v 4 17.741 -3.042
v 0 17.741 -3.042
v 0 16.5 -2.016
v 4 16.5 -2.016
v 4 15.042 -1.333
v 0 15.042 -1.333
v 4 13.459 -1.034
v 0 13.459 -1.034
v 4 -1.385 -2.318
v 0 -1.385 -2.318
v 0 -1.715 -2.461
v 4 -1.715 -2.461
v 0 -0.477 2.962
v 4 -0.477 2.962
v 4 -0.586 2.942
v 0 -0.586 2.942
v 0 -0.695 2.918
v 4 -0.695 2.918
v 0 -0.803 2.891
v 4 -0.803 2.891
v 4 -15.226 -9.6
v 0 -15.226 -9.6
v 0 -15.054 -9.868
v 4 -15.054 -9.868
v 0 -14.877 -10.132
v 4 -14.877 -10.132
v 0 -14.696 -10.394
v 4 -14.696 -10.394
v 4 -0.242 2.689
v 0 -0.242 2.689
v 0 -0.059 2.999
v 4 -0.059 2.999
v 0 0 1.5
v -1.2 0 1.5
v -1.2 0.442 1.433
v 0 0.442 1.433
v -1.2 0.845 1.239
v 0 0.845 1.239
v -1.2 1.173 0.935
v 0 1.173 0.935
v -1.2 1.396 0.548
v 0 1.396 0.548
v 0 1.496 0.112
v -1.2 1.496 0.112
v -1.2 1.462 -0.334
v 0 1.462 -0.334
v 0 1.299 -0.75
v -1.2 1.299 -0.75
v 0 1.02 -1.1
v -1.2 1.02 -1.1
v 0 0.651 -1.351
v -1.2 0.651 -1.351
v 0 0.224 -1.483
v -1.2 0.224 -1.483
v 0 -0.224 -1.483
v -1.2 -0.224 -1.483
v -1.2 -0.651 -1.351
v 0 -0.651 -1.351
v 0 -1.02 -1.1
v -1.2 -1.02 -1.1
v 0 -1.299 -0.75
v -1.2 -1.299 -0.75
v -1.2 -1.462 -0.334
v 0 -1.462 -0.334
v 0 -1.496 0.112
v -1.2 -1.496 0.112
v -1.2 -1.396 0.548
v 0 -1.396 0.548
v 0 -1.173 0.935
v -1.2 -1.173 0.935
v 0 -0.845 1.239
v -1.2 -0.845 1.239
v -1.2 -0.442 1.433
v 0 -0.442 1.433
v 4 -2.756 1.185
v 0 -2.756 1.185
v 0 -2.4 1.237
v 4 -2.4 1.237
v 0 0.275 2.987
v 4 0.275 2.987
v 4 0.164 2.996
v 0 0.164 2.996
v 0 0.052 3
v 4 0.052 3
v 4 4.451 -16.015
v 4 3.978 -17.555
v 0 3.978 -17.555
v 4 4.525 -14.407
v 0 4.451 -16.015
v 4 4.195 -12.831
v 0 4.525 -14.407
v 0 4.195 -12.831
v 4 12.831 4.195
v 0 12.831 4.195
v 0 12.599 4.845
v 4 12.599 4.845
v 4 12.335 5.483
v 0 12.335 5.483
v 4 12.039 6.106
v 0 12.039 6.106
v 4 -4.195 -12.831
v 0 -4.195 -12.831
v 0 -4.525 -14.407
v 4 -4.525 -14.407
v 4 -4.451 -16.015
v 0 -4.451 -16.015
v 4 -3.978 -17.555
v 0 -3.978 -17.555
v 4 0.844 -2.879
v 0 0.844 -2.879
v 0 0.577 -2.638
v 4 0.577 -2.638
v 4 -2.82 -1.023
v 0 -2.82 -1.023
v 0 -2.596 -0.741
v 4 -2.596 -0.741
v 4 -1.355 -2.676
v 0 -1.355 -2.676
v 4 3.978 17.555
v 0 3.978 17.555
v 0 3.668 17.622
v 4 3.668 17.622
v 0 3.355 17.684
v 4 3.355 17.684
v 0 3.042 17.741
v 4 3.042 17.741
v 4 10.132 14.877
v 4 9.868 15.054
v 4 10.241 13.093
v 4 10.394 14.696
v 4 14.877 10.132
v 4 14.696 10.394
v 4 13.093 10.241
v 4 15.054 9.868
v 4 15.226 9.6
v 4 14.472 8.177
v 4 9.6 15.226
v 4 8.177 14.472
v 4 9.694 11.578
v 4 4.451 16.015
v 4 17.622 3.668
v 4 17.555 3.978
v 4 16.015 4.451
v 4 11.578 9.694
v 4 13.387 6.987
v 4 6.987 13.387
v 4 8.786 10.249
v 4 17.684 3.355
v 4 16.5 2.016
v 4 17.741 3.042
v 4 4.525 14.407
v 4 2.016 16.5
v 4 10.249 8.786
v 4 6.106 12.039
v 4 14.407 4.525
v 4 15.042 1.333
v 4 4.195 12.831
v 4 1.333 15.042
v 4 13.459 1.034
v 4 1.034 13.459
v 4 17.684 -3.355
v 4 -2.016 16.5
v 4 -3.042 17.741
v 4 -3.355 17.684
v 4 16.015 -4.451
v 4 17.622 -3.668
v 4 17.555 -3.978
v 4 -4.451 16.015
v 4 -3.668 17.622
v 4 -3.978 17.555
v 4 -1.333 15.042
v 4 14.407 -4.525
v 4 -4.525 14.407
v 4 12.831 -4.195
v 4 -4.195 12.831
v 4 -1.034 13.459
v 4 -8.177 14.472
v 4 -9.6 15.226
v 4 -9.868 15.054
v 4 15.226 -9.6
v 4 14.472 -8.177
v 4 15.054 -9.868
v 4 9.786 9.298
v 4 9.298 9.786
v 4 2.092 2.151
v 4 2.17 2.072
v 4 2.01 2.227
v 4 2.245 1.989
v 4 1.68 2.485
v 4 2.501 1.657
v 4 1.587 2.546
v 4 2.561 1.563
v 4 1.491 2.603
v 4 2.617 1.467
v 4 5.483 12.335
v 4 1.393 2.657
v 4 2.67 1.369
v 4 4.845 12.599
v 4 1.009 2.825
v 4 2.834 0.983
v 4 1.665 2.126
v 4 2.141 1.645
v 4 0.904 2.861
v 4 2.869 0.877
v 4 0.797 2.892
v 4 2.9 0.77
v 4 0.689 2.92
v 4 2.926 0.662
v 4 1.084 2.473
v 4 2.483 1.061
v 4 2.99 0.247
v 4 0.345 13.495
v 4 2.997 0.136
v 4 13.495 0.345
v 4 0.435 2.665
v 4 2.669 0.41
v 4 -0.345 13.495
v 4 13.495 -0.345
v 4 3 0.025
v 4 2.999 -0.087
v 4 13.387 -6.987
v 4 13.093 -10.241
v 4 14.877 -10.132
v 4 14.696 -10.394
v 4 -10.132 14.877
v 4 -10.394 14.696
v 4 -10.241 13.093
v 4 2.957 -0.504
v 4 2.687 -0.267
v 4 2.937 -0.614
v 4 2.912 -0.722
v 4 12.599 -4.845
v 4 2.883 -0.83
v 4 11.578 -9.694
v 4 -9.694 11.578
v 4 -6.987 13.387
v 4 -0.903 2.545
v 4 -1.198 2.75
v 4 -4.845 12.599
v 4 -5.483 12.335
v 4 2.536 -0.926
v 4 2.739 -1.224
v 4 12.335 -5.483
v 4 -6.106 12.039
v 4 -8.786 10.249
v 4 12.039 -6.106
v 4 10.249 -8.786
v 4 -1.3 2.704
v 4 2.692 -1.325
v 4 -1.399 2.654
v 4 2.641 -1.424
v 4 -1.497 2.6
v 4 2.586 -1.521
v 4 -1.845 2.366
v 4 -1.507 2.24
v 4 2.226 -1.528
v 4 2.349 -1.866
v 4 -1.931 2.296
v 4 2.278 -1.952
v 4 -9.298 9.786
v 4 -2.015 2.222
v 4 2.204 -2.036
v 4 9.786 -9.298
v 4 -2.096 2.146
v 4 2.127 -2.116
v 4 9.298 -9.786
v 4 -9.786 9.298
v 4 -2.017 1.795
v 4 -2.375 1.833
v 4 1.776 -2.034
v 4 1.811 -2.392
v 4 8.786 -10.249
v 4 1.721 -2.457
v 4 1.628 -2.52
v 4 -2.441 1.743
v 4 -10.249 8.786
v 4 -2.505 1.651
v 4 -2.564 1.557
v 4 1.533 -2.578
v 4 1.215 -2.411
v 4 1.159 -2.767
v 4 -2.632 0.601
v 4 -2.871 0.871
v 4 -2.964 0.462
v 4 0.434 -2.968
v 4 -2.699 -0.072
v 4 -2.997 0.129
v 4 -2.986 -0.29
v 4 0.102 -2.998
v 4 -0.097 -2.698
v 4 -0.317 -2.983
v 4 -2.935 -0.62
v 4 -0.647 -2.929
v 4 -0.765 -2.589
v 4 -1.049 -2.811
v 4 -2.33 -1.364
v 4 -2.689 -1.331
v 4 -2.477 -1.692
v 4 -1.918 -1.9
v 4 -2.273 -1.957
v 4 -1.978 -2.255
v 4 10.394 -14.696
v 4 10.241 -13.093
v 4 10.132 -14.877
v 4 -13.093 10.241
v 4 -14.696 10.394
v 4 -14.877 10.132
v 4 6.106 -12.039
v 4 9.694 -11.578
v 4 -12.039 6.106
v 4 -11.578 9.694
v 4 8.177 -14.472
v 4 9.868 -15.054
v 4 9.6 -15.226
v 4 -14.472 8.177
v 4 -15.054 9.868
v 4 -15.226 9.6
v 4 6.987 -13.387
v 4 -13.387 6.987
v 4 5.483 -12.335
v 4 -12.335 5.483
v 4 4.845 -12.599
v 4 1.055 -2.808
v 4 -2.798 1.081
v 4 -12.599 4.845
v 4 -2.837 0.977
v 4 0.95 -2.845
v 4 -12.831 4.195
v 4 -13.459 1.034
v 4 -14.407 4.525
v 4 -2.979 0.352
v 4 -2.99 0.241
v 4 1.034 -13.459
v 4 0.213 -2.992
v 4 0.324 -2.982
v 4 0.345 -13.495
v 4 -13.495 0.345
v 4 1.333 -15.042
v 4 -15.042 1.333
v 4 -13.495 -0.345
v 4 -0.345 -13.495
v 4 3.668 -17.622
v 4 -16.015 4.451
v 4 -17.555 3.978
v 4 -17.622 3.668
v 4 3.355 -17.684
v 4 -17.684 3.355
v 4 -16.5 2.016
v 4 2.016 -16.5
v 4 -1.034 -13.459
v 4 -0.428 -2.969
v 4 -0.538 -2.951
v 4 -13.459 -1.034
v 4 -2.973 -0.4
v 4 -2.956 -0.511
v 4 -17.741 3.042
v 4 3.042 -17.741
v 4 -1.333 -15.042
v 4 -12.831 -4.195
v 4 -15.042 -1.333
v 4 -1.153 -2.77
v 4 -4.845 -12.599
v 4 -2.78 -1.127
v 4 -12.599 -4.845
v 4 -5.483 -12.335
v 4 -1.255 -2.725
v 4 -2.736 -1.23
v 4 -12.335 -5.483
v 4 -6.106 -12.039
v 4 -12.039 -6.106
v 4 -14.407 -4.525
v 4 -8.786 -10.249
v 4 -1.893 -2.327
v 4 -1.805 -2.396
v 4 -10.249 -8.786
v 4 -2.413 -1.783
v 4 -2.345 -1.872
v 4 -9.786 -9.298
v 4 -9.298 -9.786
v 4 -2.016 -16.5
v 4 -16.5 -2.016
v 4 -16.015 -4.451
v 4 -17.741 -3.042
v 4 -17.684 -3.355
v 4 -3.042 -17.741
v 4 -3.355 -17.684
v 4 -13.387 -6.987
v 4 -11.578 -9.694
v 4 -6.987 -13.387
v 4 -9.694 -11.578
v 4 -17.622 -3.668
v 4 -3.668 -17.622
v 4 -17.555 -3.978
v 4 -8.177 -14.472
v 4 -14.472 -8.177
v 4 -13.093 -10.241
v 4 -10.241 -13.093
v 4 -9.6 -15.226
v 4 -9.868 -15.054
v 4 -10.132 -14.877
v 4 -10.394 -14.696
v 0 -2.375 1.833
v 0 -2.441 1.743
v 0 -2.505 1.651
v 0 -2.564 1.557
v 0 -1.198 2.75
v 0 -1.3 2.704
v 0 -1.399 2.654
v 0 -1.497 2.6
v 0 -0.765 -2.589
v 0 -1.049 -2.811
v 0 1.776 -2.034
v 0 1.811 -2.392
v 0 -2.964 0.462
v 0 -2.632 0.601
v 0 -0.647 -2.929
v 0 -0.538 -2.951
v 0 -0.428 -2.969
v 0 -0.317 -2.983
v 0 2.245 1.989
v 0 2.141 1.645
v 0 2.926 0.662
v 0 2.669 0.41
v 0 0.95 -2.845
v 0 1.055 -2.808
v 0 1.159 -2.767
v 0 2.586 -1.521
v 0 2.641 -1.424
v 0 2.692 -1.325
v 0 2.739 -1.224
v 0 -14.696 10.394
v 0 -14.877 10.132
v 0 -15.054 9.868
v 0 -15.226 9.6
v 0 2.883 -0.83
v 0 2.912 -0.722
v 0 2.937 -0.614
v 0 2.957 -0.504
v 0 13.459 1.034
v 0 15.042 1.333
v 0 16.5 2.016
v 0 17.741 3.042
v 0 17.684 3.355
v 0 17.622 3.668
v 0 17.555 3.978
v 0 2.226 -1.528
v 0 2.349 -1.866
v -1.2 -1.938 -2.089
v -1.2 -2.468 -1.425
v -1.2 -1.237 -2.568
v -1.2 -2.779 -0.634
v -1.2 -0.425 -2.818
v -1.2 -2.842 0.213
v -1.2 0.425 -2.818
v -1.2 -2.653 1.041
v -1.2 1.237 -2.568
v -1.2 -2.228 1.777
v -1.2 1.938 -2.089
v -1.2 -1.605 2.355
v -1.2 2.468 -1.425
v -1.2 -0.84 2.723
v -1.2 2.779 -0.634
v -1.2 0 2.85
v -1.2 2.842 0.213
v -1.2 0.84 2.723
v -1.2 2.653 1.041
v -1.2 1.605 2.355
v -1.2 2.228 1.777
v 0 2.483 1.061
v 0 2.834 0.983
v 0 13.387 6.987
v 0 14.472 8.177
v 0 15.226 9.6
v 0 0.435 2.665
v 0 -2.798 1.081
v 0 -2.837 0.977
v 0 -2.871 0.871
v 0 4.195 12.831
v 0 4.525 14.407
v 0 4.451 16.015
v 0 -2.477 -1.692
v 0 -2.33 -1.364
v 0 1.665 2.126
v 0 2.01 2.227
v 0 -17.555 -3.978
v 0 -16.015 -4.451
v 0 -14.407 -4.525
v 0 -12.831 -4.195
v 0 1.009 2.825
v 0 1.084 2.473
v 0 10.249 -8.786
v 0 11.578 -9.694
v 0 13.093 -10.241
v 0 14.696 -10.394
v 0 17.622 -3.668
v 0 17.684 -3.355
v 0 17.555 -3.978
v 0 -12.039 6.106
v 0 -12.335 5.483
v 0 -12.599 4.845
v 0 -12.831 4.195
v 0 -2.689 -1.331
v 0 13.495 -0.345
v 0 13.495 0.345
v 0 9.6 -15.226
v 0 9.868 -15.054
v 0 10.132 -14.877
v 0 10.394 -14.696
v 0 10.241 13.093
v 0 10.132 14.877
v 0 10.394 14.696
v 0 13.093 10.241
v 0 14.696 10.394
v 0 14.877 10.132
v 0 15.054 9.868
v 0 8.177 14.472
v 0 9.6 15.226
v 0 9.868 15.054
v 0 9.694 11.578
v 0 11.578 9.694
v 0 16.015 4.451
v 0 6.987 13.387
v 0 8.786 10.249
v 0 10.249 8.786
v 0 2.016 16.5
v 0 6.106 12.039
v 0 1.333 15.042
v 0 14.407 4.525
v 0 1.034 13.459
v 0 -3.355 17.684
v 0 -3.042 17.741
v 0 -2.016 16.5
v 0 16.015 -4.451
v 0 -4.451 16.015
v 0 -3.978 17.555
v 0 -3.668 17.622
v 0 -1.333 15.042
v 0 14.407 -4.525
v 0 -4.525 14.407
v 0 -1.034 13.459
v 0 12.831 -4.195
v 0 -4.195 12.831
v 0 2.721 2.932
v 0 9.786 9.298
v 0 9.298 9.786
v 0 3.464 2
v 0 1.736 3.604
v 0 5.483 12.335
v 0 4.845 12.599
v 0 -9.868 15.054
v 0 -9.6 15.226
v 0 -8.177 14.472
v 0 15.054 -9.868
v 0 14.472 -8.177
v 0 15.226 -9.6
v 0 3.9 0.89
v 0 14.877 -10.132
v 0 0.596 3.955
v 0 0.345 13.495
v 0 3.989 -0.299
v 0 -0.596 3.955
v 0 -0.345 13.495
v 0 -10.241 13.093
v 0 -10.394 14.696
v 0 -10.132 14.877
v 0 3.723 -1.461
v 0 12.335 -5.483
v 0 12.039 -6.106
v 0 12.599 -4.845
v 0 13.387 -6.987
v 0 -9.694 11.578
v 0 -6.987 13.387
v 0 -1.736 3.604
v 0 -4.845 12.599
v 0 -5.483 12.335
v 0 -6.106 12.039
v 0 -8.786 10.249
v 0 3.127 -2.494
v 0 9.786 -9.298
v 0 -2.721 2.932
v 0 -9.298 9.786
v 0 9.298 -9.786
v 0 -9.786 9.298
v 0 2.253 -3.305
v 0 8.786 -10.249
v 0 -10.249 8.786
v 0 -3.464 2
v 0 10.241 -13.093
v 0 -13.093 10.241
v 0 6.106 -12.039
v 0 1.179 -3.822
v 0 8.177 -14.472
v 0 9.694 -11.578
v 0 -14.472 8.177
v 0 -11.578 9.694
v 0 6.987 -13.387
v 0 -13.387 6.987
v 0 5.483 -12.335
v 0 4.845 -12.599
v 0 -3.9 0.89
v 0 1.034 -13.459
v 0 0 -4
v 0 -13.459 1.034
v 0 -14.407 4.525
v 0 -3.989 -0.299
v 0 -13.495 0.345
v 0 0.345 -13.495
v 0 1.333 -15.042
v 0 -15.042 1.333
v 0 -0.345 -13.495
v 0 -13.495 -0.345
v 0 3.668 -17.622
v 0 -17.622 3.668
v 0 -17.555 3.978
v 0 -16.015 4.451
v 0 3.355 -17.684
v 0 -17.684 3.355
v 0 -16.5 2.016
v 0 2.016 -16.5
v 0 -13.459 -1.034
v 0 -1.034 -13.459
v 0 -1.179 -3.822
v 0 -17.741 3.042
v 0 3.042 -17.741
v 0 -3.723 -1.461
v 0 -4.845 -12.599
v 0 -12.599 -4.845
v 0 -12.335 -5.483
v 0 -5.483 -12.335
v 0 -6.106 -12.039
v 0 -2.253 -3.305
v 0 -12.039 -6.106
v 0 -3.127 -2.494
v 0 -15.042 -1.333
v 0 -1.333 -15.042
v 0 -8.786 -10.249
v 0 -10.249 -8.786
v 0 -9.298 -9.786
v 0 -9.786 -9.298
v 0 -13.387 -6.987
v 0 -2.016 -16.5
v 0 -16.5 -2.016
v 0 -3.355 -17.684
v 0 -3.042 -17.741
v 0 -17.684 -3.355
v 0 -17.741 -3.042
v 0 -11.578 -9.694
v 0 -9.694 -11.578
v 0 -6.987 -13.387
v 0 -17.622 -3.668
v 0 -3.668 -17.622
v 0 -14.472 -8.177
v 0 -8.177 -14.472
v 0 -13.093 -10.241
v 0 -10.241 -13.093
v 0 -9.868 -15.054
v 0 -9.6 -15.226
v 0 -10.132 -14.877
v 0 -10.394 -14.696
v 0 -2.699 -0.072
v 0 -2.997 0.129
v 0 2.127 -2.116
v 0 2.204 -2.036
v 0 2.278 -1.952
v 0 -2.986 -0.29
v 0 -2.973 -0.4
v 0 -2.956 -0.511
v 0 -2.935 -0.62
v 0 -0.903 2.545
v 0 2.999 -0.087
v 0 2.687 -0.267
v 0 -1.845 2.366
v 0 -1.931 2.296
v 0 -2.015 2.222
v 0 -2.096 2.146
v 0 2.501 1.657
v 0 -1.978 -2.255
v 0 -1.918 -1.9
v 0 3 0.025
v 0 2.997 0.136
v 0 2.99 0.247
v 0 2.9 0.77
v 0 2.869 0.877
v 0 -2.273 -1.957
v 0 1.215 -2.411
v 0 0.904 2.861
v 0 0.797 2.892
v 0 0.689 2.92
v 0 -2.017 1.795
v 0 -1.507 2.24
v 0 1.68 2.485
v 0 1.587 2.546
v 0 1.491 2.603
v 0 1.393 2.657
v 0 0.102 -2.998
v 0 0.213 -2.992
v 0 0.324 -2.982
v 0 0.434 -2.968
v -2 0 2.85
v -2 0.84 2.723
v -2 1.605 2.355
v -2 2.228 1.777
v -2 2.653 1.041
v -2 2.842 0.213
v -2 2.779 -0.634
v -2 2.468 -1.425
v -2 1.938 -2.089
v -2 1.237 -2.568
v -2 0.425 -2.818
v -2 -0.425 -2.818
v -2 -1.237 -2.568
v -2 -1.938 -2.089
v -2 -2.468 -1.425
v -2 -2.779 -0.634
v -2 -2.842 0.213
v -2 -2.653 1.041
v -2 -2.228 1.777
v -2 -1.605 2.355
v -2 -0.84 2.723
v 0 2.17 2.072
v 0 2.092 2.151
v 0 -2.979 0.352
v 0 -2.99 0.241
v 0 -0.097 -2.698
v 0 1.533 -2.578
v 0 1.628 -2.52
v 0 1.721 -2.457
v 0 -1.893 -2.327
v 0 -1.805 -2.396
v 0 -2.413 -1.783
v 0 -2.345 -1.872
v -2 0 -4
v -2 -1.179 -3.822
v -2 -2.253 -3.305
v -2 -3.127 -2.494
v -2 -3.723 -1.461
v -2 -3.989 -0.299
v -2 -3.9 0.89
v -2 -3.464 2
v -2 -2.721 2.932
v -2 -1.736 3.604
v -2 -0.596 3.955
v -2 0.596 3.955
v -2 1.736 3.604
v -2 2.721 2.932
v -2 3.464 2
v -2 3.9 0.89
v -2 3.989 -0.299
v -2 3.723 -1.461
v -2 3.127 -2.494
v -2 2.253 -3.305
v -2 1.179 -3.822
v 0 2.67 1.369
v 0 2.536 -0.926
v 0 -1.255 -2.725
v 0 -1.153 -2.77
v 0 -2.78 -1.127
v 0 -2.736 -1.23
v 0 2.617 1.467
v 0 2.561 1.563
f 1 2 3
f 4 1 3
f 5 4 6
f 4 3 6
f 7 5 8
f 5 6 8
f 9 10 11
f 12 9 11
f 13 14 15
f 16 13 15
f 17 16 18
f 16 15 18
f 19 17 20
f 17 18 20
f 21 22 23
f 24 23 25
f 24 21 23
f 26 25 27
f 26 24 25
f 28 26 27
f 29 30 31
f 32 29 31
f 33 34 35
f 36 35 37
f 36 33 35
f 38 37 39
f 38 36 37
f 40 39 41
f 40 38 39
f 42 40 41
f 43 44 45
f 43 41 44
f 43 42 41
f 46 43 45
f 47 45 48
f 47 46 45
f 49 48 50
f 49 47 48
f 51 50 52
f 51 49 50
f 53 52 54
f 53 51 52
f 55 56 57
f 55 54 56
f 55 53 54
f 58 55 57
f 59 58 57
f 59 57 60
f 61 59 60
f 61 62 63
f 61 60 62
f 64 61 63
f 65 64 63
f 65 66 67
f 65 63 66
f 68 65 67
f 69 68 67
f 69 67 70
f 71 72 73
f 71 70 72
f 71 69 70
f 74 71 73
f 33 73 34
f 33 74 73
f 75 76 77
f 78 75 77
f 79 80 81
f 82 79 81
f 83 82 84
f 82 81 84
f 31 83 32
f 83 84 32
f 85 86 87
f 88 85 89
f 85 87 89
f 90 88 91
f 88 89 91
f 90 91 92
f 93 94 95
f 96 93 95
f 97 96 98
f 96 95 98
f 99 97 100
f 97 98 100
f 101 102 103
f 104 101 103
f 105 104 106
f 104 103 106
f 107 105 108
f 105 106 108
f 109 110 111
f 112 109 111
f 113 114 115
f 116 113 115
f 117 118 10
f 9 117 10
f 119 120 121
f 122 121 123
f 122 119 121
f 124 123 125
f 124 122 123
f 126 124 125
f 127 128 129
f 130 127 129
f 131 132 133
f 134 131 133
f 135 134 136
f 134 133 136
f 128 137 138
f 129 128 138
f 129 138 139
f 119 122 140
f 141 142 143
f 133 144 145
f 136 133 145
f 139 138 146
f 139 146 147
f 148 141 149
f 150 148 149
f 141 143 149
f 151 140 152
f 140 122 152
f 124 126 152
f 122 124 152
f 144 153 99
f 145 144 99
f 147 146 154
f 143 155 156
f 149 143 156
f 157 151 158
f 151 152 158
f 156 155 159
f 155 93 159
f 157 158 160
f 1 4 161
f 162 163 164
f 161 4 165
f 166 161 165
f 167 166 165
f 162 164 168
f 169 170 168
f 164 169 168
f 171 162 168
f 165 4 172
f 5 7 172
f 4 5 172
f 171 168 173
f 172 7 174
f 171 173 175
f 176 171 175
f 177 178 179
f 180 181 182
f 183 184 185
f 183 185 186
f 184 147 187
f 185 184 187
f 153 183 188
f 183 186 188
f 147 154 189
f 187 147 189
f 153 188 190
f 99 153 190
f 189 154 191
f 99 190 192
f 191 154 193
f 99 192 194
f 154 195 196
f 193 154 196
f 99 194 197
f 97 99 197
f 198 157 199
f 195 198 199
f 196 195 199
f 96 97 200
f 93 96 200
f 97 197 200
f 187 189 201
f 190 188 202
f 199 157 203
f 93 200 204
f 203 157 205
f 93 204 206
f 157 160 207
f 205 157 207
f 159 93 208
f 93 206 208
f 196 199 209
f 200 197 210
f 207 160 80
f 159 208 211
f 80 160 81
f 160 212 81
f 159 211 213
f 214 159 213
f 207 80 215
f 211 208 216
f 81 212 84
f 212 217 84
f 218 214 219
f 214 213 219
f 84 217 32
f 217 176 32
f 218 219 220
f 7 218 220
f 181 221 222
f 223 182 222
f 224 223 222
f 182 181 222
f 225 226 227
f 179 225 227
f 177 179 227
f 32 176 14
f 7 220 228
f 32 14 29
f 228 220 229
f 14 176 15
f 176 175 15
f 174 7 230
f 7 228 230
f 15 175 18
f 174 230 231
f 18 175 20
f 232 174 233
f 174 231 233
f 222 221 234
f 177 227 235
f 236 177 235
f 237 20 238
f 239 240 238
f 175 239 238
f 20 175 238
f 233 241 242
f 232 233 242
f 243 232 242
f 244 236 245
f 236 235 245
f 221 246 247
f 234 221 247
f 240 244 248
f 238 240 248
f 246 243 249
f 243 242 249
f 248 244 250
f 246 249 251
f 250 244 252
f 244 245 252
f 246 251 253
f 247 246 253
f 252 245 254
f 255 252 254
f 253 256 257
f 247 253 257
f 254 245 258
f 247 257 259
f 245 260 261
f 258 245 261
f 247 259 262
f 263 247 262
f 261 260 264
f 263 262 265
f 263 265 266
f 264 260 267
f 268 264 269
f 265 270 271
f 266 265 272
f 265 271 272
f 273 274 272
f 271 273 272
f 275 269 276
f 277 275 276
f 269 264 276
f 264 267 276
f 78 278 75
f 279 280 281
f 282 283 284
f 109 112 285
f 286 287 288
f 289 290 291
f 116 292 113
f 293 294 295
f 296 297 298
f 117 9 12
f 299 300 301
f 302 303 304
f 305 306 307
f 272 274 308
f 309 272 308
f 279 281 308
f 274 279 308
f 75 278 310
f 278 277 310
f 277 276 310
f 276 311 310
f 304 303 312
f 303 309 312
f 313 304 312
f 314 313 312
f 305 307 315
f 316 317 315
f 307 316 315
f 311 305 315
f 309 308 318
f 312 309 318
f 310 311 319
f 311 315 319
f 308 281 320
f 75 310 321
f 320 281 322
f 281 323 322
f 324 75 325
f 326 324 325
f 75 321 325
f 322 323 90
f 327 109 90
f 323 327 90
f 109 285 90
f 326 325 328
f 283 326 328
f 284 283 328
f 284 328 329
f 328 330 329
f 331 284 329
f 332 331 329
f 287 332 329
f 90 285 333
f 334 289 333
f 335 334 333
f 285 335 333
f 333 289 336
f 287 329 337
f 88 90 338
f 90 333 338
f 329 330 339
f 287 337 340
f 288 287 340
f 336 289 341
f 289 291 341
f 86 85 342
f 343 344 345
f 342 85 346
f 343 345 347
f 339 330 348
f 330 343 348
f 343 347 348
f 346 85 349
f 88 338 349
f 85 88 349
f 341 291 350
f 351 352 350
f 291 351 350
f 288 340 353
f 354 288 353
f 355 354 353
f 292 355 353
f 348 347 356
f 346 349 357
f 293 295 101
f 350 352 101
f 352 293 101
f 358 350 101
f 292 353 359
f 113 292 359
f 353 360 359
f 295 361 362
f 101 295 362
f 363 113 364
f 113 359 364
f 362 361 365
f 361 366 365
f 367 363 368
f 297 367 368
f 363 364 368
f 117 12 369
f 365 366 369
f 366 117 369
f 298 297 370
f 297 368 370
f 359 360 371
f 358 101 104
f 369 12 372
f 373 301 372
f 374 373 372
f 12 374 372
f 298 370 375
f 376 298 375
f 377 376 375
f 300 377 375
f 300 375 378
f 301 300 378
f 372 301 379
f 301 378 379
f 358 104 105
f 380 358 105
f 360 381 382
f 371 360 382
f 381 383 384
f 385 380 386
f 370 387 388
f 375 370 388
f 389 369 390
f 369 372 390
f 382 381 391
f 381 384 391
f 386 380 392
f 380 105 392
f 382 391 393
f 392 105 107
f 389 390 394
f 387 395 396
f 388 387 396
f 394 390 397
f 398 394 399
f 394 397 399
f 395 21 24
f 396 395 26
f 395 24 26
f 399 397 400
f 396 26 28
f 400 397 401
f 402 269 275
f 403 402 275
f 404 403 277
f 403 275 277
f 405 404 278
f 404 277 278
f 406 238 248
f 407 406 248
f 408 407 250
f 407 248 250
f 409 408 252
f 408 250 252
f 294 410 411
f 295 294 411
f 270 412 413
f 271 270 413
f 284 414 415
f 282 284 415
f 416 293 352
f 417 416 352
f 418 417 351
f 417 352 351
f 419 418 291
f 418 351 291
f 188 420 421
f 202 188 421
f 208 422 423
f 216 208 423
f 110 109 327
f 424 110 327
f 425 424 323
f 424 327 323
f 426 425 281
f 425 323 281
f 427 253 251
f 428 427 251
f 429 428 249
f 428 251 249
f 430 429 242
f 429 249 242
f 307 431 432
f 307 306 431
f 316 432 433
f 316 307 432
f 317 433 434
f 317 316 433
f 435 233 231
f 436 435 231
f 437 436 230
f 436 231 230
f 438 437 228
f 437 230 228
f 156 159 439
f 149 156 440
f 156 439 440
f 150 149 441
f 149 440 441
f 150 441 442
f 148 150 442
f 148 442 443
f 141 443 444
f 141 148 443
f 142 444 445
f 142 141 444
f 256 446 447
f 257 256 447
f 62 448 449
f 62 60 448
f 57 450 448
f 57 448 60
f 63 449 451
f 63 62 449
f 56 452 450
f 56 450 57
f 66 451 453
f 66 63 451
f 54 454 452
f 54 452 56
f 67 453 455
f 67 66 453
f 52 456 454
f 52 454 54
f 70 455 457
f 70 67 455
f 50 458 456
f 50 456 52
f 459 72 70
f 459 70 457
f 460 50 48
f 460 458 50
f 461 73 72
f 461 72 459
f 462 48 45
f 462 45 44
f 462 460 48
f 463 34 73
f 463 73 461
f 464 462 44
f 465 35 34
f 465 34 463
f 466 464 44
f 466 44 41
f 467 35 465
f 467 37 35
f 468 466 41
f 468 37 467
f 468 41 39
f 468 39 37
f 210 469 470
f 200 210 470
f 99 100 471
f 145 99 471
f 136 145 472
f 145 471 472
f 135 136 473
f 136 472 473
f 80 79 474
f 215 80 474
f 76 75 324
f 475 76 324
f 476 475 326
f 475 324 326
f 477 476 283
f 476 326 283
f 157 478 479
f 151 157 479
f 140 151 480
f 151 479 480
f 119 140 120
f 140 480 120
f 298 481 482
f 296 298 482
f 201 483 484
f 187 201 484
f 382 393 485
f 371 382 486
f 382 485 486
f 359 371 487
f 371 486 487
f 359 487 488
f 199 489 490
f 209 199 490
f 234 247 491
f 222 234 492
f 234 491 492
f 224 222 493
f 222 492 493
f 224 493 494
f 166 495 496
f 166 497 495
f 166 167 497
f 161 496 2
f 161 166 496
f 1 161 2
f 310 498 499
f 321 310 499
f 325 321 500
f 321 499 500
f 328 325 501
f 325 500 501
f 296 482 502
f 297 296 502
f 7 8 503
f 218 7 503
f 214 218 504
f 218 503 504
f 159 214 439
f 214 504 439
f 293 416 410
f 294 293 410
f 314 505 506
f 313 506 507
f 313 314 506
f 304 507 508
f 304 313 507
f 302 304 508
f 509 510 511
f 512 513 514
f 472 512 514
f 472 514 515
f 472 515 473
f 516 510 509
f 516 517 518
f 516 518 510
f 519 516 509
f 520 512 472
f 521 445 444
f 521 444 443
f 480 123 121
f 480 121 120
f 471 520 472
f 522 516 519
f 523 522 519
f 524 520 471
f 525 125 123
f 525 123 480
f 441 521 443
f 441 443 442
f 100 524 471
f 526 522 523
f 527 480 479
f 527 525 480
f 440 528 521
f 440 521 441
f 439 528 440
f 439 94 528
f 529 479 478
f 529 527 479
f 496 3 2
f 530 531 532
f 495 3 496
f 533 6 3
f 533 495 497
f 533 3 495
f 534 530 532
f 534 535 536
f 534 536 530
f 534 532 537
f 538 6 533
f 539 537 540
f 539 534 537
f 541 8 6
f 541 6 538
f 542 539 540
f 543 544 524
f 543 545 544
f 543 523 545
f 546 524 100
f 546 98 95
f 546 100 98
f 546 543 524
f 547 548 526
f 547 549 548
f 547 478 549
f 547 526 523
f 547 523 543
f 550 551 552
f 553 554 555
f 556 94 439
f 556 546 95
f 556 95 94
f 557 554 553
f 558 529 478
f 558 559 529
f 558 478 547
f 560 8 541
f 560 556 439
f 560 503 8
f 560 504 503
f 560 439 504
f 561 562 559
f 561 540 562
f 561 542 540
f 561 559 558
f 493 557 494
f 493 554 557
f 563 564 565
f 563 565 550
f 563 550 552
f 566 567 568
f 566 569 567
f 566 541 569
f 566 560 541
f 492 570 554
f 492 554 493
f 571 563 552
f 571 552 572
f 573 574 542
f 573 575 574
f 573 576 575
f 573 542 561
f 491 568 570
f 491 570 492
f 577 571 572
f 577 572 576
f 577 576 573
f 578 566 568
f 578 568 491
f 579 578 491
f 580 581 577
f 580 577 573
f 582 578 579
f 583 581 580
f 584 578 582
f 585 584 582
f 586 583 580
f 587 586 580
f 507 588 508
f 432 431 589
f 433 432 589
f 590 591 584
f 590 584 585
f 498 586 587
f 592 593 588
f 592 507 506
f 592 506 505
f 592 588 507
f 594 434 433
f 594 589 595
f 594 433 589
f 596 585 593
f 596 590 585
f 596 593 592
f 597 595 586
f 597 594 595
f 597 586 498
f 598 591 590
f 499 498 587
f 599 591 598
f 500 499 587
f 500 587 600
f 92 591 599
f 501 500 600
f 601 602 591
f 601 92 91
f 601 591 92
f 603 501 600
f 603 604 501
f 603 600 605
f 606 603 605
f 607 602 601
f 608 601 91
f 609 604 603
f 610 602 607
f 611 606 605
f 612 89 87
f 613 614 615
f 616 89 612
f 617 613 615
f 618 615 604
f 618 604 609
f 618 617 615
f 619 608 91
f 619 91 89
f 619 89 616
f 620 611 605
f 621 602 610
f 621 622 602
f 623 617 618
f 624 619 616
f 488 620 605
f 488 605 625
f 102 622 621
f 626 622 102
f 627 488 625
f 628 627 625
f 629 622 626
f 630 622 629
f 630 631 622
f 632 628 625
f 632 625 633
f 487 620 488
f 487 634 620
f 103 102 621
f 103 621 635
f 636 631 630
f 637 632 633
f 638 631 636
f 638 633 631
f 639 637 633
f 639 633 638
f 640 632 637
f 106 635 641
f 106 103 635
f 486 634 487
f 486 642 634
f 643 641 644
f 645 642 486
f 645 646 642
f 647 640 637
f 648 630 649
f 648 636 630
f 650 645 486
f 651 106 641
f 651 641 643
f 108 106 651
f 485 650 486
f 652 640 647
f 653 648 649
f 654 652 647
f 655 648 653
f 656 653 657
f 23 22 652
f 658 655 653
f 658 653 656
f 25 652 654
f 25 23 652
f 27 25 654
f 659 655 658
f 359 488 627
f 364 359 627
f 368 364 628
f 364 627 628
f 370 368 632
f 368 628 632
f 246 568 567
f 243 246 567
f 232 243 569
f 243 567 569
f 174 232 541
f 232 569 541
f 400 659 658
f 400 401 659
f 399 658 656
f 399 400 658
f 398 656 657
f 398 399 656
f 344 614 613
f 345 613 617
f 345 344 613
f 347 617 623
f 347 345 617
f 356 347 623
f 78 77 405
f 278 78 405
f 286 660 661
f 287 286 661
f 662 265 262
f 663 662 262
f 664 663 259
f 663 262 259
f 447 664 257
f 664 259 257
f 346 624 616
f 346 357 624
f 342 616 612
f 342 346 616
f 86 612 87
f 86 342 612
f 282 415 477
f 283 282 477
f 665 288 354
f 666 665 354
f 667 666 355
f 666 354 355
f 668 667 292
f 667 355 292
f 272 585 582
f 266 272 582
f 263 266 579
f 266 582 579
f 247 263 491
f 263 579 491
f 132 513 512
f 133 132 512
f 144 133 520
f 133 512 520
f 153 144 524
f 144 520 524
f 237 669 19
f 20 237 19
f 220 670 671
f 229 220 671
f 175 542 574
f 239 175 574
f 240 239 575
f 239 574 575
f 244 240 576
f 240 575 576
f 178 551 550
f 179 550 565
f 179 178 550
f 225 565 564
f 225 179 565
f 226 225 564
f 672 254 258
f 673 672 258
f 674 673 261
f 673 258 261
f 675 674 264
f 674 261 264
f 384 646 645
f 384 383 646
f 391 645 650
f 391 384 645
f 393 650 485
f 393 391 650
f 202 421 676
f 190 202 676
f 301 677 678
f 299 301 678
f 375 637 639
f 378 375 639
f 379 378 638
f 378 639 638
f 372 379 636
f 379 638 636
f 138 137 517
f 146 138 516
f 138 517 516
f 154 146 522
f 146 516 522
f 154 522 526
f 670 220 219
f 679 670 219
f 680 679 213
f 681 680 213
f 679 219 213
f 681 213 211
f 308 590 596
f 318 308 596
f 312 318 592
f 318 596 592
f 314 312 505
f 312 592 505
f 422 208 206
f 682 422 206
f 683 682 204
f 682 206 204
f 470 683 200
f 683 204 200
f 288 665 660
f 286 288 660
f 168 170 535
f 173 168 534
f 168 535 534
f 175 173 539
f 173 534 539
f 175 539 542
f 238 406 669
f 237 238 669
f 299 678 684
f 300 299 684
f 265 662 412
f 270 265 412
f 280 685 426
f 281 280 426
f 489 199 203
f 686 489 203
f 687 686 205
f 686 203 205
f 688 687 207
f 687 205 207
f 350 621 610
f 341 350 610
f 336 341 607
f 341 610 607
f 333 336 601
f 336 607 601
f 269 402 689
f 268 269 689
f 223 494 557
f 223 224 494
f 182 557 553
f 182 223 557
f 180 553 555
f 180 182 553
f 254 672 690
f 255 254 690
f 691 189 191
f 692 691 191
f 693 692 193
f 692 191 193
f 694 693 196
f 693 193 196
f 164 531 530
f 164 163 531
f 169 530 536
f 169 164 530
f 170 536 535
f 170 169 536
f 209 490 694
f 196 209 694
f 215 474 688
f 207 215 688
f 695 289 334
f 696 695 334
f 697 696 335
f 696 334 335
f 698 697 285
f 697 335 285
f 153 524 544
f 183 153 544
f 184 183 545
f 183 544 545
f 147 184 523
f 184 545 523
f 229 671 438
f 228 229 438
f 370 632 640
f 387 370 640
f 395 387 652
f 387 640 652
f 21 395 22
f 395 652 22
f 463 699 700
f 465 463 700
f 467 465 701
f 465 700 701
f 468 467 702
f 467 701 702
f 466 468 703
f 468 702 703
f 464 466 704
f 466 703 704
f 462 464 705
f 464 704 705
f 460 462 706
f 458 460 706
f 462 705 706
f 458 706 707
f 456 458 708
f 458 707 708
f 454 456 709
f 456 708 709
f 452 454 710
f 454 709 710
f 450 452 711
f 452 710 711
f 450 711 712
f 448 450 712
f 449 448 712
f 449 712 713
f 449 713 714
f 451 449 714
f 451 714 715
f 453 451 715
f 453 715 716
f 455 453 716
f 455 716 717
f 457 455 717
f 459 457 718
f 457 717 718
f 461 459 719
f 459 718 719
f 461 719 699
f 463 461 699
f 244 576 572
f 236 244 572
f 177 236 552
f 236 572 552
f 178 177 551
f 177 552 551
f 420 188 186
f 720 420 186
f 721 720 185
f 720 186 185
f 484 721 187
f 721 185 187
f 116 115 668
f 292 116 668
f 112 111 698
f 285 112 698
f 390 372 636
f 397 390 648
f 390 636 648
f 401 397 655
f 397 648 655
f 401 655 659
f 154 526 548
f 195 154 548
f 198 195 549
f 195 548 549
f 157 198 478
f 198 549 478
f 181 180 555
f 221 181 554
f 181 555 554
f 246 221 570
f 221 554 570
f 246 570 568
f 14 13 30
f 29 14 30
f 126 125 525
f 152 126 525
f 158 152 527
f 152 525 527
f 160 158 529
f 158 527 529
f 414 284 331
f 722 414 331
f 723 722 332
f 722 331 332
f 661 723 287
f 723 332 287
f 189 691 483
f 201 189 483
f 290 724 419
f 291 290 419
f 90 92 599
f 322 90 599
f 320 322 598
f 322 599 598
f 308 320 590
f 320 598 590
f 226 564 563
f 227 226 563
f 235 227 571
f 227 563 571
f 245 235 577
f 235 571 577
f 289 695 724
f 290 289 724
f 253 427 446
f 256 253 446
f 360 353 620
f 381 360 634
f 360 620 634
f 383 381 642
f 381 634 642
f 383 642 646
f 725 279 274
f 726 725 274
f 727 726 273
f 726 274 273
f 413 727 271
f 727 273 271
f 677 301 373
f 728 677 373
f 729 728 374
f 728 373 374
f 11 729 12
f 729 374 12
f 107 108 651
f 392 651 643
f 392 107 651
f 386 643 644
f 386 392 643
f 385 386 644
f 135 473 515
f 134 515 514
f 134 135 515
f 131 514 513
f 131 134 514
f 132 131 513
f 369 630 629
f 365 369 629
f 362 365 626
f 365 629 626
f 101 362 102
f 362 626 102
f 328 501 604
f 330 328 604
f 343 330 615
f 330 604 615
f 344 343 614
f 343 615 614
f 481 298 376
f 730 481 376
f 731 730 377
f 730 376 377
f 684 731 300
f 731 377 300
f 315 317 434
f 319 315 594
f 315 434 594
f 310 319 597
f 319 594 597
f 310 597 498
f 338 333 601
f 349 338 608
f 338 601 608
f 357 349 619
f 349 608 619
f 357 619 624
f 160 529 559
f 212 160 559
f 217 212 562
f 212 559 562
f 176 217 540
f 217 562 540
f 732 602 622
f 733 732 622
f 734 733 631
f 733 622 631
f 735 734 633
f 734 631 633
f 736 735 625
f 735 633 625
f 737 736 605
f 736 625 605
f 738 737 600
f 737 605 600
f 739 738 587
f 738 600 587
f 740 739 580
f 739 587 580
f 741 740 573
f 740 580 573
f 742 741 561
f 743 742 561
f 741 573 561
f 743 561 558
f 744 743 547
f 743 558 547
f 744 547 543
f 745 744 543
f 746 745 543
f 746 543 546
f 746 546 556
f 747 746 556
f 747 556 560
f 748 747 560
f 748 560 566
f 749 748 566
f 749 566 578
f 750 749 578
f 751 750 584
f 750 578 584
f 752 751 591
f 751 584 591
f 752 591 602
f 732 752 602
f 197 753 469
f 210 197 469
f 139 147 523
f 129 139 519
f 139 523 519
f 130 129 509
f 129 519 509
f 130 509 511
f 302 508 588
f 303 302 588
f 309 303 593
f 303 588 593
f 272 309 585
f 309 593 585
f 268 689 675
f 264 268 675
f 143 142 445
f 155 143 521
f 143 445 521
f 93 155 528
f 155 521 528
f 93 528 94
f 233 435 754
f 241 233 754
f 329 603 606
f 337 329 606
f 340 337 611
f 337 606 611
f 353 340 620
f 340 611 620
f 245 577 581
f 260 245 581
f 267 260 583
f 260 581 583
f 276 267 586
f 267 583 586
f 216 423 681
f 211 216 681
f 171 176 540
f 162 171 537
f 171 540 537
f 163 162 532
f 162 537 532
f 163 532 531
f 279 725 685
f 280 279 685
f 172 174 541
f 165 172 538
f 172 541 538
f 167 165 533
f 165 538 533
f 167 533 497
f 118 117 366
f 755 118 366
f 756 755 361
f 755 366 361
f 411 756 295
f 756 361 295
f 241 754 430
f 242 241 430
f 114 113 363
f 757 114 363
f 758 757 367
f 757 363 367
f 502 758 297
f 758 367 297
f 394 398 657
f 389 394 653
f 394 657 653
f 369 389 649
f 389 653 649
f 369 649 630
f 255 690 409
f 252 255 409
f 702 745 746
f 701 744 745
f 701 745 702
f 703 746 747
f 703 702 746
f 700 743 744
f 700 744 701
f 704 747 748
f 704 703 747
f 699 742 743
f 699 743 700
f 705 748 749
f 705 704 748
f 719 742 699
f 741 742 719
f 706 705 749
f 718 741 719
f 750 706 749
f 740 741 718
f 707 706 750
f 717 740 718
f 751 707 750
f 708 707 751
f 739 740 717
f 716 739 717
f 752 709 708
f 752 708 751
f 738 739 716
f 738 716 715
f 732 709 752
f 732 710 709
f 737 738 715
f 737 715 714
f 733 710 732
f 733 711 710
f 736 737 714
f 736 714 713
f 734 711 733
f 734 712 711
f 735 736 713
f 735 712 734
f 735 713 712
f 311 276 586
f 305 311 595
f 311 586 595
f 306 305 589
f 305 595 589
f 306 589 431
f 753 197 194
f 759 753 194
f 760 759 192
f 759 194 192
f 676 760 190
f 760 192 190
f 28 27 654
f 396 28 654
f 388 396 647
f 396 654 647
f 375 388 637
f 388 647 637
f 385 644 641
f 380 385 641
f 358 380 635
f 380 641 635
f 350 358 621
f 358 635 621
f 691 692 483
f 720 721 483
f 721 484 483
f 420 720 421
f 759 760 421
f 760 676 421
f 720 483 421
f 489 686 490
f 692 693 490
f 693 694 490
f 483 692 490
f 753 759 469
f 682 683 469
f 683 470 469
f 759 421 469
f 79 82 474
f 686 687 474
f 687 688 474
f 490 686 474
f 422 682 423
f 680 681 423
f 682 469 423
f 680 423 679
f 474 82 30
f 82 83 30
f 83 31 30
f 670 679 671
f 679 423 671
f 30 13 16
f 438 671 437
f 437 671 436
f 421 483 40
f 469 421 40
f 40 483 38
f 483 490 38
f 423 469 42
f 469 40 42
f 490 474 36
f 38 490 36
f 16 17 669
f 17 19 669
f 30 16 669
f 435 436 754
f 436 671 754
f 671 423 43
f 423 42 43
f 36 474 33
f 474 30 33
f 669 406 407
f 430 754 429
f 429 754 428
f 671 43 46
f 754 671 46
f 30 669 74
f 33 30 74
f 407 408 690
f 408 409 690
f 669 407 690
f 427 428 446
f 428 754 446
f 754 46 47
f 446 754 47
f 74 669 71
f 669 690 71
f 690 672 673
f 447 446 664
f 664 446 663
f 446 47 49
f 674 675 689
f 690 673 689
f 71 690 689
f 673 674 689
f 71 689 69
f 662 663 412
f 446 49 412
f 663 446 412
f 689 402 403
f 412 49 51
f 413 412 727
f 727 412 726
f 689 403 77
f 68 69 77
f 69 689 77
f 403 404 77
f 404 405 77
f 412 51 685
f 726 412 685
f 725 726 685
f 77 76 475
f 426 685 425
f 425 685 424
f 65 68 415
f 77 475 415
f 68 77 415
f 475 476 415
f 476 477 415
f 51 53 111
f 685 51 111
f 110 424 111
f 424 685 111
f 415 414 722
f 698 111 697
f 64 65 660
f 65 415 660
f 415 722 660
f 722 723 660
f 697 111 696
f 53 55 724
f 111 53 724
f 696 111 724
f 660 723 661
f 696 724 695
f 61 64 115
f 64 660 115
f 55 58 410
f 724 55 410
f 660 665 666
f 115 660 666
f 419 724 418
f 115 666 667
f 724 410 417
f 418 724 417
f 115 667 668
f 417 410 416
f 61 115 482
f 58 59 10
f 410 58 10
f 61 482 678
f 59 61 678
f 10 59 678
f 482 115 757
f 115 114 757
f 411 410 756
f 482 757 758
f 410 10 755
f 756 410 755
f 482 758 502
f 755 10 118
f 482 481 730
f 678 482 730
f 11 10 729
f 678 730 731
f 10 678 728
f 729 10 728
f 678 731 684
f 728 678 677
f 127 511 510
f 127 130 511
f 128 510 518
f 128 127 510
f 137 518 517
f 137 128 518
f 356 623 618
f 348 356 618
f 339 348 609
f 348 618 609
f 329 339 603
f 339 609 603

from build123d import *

# Parameters (mm, degrees)
BASPROSKE_W             = 4
BASPROSKE_H             = 18
TOOTHCUT_DEPTH          = 26.768197453
TEETHCUTS_COUNT         = 16
TEETHCUTS_ANGLE         = 337.5
BORSKE_R                = 3
BORE_DEPTH              = 50.0000508
SALIENTE_EXTRUIR2_DEPTH = 4
MATRIZC1_COUNT          = 25
CROQUIS5_R              = 4
CROQUIS5_R_2            = 1.5
SALIENTE_EXTRUIR3_DEPTH = 2
CROQUIS6_R              = 2.85
CORTAR_EXTRUIR4_DEPTH   = 0.8


with BuildPart() as part:
    # BasProSke → Base-Revolve (revolve)
    with BuildSketch(Plane(origin=(0, 0, 0), x_dir=(1, 0, 0), z_dir=(0, 1, 0)), mode=Mode.PRIVATE) as base_revolve_sk:
        with Locations((2, 9)):
            Rectangle(BASPROSKE_W, BASPROSKE_H)
    revolve(base_revolve_sk.sketch.rotate(Axis((-10, 0, 0), (1, 0, 0)), 180), axis=Axis((-10, 0, 0), (1, 0, 0)))

    # TooCutSke → ToothCut (cut, through all)
    with BuildSketch(Plane(origin=(0, 0, 0), x_dir=(0, 0, -1), z_dir=(1, 0, 0))):
        with BuildLine():
            ThreePointArc((1.03434411, 13.459313997), (0, 13.499), (-1.03434411, 13.459313997))
            ThreePointArc((-1.03434411, 13.459313997), (-1.635143665, 15.806872195), (-3.065655864, 17.762792553))
            ThreePointArc((-3.065655864, 17.762792553), (0, 18.0254), (3.065655864, 17.762792553))
            ThreePointArc((3.065655864, 17.762792553), (1.635143665, 15.806872195), (1.03434411, 13.459313997))
        make_face()
    toothcut = extrude(amount=TOOTHCUT_DEPTH, mode=Mode.SUBTRACT)

    # TeethCuts: ToothCut ×16 about axis
    teethcuts_axis = Axis((-10, 0, 0), (1, 0, 0))
    for i in range(1, TEETHCUTS_COUNT):
        add(toothcut.rotate(teethcuts_axis, i * TEETHCUTS_ANGLE / (TEETHCUTS_COUNT - 1)), mode=Mode.SUBTRACT)

    # BorSke → Bore (cut, symmetric)
    with BuildSketch(Plane(origin=(0, 0, 0), x_dir=(0, 0, -1), z_dir=(1, 0, 0))):
        with Locations(Location((0, 0, 0), (0, 0, 180))):
            Circle(BORSKE_R)
    extrude(amount=BORE_DEPTH, both=True, mode=Mode.SUBTRACT)

    # Croquis4 → Saliente-Extruir2 (add, through all)
    with BuildSketch(Plane.ZY):
        with BuildLine():
            Line((-0.266547398, 2.686810839), (-0.504049329, 2.957352579))
            ThreePointArc((-0.504049329, 2.957352579), (-0.296163775, 2.985345377), (-0.08683031, 2.998743153))
            Line((-0.08683031, 2.998743153), (-0.266547398, 2.686810839))
        make_face()
    saliente_extruir2 = extrude(amount=-SALIENTE_EXTRUIR2_DEPTH)

    # MatrizC1: Saliente-Extruir2 ×25 about axis
    matrizc1_axis = Axis((0, 0, 0), (1, 0, 0))
    for i in range(1, MATRIZC1_COUNT):
        add(saliente_extruir2.rotate(matrizc1_axis, i * 360 / MATRIZC1_COUNT))

    # Croquis5 → Saliente-Extruir3 (add)
    with BuildSketch(Plane.ZY):
        with Locations(Location((0, 0, 0), (0, 0, 180))):
            Circle(CROQUIS5_R)
        Circle(CROQUIS5_R_2, mode=Mode.SUBTRACT)
    extrude(amount=SALIENTE_EXTRUIR3_DEPTH)

    # Croquis6 → Cortar-Extruir4 (cut)
    with BuildSketch(Plane.ZY.offset(2)):
        Circle(CROQUIS6_R)
    extrude(amount=-CORTAR_EXTRUIR4_DEPTH, mode=Mode.SUBTRACT)


solid = part.part
